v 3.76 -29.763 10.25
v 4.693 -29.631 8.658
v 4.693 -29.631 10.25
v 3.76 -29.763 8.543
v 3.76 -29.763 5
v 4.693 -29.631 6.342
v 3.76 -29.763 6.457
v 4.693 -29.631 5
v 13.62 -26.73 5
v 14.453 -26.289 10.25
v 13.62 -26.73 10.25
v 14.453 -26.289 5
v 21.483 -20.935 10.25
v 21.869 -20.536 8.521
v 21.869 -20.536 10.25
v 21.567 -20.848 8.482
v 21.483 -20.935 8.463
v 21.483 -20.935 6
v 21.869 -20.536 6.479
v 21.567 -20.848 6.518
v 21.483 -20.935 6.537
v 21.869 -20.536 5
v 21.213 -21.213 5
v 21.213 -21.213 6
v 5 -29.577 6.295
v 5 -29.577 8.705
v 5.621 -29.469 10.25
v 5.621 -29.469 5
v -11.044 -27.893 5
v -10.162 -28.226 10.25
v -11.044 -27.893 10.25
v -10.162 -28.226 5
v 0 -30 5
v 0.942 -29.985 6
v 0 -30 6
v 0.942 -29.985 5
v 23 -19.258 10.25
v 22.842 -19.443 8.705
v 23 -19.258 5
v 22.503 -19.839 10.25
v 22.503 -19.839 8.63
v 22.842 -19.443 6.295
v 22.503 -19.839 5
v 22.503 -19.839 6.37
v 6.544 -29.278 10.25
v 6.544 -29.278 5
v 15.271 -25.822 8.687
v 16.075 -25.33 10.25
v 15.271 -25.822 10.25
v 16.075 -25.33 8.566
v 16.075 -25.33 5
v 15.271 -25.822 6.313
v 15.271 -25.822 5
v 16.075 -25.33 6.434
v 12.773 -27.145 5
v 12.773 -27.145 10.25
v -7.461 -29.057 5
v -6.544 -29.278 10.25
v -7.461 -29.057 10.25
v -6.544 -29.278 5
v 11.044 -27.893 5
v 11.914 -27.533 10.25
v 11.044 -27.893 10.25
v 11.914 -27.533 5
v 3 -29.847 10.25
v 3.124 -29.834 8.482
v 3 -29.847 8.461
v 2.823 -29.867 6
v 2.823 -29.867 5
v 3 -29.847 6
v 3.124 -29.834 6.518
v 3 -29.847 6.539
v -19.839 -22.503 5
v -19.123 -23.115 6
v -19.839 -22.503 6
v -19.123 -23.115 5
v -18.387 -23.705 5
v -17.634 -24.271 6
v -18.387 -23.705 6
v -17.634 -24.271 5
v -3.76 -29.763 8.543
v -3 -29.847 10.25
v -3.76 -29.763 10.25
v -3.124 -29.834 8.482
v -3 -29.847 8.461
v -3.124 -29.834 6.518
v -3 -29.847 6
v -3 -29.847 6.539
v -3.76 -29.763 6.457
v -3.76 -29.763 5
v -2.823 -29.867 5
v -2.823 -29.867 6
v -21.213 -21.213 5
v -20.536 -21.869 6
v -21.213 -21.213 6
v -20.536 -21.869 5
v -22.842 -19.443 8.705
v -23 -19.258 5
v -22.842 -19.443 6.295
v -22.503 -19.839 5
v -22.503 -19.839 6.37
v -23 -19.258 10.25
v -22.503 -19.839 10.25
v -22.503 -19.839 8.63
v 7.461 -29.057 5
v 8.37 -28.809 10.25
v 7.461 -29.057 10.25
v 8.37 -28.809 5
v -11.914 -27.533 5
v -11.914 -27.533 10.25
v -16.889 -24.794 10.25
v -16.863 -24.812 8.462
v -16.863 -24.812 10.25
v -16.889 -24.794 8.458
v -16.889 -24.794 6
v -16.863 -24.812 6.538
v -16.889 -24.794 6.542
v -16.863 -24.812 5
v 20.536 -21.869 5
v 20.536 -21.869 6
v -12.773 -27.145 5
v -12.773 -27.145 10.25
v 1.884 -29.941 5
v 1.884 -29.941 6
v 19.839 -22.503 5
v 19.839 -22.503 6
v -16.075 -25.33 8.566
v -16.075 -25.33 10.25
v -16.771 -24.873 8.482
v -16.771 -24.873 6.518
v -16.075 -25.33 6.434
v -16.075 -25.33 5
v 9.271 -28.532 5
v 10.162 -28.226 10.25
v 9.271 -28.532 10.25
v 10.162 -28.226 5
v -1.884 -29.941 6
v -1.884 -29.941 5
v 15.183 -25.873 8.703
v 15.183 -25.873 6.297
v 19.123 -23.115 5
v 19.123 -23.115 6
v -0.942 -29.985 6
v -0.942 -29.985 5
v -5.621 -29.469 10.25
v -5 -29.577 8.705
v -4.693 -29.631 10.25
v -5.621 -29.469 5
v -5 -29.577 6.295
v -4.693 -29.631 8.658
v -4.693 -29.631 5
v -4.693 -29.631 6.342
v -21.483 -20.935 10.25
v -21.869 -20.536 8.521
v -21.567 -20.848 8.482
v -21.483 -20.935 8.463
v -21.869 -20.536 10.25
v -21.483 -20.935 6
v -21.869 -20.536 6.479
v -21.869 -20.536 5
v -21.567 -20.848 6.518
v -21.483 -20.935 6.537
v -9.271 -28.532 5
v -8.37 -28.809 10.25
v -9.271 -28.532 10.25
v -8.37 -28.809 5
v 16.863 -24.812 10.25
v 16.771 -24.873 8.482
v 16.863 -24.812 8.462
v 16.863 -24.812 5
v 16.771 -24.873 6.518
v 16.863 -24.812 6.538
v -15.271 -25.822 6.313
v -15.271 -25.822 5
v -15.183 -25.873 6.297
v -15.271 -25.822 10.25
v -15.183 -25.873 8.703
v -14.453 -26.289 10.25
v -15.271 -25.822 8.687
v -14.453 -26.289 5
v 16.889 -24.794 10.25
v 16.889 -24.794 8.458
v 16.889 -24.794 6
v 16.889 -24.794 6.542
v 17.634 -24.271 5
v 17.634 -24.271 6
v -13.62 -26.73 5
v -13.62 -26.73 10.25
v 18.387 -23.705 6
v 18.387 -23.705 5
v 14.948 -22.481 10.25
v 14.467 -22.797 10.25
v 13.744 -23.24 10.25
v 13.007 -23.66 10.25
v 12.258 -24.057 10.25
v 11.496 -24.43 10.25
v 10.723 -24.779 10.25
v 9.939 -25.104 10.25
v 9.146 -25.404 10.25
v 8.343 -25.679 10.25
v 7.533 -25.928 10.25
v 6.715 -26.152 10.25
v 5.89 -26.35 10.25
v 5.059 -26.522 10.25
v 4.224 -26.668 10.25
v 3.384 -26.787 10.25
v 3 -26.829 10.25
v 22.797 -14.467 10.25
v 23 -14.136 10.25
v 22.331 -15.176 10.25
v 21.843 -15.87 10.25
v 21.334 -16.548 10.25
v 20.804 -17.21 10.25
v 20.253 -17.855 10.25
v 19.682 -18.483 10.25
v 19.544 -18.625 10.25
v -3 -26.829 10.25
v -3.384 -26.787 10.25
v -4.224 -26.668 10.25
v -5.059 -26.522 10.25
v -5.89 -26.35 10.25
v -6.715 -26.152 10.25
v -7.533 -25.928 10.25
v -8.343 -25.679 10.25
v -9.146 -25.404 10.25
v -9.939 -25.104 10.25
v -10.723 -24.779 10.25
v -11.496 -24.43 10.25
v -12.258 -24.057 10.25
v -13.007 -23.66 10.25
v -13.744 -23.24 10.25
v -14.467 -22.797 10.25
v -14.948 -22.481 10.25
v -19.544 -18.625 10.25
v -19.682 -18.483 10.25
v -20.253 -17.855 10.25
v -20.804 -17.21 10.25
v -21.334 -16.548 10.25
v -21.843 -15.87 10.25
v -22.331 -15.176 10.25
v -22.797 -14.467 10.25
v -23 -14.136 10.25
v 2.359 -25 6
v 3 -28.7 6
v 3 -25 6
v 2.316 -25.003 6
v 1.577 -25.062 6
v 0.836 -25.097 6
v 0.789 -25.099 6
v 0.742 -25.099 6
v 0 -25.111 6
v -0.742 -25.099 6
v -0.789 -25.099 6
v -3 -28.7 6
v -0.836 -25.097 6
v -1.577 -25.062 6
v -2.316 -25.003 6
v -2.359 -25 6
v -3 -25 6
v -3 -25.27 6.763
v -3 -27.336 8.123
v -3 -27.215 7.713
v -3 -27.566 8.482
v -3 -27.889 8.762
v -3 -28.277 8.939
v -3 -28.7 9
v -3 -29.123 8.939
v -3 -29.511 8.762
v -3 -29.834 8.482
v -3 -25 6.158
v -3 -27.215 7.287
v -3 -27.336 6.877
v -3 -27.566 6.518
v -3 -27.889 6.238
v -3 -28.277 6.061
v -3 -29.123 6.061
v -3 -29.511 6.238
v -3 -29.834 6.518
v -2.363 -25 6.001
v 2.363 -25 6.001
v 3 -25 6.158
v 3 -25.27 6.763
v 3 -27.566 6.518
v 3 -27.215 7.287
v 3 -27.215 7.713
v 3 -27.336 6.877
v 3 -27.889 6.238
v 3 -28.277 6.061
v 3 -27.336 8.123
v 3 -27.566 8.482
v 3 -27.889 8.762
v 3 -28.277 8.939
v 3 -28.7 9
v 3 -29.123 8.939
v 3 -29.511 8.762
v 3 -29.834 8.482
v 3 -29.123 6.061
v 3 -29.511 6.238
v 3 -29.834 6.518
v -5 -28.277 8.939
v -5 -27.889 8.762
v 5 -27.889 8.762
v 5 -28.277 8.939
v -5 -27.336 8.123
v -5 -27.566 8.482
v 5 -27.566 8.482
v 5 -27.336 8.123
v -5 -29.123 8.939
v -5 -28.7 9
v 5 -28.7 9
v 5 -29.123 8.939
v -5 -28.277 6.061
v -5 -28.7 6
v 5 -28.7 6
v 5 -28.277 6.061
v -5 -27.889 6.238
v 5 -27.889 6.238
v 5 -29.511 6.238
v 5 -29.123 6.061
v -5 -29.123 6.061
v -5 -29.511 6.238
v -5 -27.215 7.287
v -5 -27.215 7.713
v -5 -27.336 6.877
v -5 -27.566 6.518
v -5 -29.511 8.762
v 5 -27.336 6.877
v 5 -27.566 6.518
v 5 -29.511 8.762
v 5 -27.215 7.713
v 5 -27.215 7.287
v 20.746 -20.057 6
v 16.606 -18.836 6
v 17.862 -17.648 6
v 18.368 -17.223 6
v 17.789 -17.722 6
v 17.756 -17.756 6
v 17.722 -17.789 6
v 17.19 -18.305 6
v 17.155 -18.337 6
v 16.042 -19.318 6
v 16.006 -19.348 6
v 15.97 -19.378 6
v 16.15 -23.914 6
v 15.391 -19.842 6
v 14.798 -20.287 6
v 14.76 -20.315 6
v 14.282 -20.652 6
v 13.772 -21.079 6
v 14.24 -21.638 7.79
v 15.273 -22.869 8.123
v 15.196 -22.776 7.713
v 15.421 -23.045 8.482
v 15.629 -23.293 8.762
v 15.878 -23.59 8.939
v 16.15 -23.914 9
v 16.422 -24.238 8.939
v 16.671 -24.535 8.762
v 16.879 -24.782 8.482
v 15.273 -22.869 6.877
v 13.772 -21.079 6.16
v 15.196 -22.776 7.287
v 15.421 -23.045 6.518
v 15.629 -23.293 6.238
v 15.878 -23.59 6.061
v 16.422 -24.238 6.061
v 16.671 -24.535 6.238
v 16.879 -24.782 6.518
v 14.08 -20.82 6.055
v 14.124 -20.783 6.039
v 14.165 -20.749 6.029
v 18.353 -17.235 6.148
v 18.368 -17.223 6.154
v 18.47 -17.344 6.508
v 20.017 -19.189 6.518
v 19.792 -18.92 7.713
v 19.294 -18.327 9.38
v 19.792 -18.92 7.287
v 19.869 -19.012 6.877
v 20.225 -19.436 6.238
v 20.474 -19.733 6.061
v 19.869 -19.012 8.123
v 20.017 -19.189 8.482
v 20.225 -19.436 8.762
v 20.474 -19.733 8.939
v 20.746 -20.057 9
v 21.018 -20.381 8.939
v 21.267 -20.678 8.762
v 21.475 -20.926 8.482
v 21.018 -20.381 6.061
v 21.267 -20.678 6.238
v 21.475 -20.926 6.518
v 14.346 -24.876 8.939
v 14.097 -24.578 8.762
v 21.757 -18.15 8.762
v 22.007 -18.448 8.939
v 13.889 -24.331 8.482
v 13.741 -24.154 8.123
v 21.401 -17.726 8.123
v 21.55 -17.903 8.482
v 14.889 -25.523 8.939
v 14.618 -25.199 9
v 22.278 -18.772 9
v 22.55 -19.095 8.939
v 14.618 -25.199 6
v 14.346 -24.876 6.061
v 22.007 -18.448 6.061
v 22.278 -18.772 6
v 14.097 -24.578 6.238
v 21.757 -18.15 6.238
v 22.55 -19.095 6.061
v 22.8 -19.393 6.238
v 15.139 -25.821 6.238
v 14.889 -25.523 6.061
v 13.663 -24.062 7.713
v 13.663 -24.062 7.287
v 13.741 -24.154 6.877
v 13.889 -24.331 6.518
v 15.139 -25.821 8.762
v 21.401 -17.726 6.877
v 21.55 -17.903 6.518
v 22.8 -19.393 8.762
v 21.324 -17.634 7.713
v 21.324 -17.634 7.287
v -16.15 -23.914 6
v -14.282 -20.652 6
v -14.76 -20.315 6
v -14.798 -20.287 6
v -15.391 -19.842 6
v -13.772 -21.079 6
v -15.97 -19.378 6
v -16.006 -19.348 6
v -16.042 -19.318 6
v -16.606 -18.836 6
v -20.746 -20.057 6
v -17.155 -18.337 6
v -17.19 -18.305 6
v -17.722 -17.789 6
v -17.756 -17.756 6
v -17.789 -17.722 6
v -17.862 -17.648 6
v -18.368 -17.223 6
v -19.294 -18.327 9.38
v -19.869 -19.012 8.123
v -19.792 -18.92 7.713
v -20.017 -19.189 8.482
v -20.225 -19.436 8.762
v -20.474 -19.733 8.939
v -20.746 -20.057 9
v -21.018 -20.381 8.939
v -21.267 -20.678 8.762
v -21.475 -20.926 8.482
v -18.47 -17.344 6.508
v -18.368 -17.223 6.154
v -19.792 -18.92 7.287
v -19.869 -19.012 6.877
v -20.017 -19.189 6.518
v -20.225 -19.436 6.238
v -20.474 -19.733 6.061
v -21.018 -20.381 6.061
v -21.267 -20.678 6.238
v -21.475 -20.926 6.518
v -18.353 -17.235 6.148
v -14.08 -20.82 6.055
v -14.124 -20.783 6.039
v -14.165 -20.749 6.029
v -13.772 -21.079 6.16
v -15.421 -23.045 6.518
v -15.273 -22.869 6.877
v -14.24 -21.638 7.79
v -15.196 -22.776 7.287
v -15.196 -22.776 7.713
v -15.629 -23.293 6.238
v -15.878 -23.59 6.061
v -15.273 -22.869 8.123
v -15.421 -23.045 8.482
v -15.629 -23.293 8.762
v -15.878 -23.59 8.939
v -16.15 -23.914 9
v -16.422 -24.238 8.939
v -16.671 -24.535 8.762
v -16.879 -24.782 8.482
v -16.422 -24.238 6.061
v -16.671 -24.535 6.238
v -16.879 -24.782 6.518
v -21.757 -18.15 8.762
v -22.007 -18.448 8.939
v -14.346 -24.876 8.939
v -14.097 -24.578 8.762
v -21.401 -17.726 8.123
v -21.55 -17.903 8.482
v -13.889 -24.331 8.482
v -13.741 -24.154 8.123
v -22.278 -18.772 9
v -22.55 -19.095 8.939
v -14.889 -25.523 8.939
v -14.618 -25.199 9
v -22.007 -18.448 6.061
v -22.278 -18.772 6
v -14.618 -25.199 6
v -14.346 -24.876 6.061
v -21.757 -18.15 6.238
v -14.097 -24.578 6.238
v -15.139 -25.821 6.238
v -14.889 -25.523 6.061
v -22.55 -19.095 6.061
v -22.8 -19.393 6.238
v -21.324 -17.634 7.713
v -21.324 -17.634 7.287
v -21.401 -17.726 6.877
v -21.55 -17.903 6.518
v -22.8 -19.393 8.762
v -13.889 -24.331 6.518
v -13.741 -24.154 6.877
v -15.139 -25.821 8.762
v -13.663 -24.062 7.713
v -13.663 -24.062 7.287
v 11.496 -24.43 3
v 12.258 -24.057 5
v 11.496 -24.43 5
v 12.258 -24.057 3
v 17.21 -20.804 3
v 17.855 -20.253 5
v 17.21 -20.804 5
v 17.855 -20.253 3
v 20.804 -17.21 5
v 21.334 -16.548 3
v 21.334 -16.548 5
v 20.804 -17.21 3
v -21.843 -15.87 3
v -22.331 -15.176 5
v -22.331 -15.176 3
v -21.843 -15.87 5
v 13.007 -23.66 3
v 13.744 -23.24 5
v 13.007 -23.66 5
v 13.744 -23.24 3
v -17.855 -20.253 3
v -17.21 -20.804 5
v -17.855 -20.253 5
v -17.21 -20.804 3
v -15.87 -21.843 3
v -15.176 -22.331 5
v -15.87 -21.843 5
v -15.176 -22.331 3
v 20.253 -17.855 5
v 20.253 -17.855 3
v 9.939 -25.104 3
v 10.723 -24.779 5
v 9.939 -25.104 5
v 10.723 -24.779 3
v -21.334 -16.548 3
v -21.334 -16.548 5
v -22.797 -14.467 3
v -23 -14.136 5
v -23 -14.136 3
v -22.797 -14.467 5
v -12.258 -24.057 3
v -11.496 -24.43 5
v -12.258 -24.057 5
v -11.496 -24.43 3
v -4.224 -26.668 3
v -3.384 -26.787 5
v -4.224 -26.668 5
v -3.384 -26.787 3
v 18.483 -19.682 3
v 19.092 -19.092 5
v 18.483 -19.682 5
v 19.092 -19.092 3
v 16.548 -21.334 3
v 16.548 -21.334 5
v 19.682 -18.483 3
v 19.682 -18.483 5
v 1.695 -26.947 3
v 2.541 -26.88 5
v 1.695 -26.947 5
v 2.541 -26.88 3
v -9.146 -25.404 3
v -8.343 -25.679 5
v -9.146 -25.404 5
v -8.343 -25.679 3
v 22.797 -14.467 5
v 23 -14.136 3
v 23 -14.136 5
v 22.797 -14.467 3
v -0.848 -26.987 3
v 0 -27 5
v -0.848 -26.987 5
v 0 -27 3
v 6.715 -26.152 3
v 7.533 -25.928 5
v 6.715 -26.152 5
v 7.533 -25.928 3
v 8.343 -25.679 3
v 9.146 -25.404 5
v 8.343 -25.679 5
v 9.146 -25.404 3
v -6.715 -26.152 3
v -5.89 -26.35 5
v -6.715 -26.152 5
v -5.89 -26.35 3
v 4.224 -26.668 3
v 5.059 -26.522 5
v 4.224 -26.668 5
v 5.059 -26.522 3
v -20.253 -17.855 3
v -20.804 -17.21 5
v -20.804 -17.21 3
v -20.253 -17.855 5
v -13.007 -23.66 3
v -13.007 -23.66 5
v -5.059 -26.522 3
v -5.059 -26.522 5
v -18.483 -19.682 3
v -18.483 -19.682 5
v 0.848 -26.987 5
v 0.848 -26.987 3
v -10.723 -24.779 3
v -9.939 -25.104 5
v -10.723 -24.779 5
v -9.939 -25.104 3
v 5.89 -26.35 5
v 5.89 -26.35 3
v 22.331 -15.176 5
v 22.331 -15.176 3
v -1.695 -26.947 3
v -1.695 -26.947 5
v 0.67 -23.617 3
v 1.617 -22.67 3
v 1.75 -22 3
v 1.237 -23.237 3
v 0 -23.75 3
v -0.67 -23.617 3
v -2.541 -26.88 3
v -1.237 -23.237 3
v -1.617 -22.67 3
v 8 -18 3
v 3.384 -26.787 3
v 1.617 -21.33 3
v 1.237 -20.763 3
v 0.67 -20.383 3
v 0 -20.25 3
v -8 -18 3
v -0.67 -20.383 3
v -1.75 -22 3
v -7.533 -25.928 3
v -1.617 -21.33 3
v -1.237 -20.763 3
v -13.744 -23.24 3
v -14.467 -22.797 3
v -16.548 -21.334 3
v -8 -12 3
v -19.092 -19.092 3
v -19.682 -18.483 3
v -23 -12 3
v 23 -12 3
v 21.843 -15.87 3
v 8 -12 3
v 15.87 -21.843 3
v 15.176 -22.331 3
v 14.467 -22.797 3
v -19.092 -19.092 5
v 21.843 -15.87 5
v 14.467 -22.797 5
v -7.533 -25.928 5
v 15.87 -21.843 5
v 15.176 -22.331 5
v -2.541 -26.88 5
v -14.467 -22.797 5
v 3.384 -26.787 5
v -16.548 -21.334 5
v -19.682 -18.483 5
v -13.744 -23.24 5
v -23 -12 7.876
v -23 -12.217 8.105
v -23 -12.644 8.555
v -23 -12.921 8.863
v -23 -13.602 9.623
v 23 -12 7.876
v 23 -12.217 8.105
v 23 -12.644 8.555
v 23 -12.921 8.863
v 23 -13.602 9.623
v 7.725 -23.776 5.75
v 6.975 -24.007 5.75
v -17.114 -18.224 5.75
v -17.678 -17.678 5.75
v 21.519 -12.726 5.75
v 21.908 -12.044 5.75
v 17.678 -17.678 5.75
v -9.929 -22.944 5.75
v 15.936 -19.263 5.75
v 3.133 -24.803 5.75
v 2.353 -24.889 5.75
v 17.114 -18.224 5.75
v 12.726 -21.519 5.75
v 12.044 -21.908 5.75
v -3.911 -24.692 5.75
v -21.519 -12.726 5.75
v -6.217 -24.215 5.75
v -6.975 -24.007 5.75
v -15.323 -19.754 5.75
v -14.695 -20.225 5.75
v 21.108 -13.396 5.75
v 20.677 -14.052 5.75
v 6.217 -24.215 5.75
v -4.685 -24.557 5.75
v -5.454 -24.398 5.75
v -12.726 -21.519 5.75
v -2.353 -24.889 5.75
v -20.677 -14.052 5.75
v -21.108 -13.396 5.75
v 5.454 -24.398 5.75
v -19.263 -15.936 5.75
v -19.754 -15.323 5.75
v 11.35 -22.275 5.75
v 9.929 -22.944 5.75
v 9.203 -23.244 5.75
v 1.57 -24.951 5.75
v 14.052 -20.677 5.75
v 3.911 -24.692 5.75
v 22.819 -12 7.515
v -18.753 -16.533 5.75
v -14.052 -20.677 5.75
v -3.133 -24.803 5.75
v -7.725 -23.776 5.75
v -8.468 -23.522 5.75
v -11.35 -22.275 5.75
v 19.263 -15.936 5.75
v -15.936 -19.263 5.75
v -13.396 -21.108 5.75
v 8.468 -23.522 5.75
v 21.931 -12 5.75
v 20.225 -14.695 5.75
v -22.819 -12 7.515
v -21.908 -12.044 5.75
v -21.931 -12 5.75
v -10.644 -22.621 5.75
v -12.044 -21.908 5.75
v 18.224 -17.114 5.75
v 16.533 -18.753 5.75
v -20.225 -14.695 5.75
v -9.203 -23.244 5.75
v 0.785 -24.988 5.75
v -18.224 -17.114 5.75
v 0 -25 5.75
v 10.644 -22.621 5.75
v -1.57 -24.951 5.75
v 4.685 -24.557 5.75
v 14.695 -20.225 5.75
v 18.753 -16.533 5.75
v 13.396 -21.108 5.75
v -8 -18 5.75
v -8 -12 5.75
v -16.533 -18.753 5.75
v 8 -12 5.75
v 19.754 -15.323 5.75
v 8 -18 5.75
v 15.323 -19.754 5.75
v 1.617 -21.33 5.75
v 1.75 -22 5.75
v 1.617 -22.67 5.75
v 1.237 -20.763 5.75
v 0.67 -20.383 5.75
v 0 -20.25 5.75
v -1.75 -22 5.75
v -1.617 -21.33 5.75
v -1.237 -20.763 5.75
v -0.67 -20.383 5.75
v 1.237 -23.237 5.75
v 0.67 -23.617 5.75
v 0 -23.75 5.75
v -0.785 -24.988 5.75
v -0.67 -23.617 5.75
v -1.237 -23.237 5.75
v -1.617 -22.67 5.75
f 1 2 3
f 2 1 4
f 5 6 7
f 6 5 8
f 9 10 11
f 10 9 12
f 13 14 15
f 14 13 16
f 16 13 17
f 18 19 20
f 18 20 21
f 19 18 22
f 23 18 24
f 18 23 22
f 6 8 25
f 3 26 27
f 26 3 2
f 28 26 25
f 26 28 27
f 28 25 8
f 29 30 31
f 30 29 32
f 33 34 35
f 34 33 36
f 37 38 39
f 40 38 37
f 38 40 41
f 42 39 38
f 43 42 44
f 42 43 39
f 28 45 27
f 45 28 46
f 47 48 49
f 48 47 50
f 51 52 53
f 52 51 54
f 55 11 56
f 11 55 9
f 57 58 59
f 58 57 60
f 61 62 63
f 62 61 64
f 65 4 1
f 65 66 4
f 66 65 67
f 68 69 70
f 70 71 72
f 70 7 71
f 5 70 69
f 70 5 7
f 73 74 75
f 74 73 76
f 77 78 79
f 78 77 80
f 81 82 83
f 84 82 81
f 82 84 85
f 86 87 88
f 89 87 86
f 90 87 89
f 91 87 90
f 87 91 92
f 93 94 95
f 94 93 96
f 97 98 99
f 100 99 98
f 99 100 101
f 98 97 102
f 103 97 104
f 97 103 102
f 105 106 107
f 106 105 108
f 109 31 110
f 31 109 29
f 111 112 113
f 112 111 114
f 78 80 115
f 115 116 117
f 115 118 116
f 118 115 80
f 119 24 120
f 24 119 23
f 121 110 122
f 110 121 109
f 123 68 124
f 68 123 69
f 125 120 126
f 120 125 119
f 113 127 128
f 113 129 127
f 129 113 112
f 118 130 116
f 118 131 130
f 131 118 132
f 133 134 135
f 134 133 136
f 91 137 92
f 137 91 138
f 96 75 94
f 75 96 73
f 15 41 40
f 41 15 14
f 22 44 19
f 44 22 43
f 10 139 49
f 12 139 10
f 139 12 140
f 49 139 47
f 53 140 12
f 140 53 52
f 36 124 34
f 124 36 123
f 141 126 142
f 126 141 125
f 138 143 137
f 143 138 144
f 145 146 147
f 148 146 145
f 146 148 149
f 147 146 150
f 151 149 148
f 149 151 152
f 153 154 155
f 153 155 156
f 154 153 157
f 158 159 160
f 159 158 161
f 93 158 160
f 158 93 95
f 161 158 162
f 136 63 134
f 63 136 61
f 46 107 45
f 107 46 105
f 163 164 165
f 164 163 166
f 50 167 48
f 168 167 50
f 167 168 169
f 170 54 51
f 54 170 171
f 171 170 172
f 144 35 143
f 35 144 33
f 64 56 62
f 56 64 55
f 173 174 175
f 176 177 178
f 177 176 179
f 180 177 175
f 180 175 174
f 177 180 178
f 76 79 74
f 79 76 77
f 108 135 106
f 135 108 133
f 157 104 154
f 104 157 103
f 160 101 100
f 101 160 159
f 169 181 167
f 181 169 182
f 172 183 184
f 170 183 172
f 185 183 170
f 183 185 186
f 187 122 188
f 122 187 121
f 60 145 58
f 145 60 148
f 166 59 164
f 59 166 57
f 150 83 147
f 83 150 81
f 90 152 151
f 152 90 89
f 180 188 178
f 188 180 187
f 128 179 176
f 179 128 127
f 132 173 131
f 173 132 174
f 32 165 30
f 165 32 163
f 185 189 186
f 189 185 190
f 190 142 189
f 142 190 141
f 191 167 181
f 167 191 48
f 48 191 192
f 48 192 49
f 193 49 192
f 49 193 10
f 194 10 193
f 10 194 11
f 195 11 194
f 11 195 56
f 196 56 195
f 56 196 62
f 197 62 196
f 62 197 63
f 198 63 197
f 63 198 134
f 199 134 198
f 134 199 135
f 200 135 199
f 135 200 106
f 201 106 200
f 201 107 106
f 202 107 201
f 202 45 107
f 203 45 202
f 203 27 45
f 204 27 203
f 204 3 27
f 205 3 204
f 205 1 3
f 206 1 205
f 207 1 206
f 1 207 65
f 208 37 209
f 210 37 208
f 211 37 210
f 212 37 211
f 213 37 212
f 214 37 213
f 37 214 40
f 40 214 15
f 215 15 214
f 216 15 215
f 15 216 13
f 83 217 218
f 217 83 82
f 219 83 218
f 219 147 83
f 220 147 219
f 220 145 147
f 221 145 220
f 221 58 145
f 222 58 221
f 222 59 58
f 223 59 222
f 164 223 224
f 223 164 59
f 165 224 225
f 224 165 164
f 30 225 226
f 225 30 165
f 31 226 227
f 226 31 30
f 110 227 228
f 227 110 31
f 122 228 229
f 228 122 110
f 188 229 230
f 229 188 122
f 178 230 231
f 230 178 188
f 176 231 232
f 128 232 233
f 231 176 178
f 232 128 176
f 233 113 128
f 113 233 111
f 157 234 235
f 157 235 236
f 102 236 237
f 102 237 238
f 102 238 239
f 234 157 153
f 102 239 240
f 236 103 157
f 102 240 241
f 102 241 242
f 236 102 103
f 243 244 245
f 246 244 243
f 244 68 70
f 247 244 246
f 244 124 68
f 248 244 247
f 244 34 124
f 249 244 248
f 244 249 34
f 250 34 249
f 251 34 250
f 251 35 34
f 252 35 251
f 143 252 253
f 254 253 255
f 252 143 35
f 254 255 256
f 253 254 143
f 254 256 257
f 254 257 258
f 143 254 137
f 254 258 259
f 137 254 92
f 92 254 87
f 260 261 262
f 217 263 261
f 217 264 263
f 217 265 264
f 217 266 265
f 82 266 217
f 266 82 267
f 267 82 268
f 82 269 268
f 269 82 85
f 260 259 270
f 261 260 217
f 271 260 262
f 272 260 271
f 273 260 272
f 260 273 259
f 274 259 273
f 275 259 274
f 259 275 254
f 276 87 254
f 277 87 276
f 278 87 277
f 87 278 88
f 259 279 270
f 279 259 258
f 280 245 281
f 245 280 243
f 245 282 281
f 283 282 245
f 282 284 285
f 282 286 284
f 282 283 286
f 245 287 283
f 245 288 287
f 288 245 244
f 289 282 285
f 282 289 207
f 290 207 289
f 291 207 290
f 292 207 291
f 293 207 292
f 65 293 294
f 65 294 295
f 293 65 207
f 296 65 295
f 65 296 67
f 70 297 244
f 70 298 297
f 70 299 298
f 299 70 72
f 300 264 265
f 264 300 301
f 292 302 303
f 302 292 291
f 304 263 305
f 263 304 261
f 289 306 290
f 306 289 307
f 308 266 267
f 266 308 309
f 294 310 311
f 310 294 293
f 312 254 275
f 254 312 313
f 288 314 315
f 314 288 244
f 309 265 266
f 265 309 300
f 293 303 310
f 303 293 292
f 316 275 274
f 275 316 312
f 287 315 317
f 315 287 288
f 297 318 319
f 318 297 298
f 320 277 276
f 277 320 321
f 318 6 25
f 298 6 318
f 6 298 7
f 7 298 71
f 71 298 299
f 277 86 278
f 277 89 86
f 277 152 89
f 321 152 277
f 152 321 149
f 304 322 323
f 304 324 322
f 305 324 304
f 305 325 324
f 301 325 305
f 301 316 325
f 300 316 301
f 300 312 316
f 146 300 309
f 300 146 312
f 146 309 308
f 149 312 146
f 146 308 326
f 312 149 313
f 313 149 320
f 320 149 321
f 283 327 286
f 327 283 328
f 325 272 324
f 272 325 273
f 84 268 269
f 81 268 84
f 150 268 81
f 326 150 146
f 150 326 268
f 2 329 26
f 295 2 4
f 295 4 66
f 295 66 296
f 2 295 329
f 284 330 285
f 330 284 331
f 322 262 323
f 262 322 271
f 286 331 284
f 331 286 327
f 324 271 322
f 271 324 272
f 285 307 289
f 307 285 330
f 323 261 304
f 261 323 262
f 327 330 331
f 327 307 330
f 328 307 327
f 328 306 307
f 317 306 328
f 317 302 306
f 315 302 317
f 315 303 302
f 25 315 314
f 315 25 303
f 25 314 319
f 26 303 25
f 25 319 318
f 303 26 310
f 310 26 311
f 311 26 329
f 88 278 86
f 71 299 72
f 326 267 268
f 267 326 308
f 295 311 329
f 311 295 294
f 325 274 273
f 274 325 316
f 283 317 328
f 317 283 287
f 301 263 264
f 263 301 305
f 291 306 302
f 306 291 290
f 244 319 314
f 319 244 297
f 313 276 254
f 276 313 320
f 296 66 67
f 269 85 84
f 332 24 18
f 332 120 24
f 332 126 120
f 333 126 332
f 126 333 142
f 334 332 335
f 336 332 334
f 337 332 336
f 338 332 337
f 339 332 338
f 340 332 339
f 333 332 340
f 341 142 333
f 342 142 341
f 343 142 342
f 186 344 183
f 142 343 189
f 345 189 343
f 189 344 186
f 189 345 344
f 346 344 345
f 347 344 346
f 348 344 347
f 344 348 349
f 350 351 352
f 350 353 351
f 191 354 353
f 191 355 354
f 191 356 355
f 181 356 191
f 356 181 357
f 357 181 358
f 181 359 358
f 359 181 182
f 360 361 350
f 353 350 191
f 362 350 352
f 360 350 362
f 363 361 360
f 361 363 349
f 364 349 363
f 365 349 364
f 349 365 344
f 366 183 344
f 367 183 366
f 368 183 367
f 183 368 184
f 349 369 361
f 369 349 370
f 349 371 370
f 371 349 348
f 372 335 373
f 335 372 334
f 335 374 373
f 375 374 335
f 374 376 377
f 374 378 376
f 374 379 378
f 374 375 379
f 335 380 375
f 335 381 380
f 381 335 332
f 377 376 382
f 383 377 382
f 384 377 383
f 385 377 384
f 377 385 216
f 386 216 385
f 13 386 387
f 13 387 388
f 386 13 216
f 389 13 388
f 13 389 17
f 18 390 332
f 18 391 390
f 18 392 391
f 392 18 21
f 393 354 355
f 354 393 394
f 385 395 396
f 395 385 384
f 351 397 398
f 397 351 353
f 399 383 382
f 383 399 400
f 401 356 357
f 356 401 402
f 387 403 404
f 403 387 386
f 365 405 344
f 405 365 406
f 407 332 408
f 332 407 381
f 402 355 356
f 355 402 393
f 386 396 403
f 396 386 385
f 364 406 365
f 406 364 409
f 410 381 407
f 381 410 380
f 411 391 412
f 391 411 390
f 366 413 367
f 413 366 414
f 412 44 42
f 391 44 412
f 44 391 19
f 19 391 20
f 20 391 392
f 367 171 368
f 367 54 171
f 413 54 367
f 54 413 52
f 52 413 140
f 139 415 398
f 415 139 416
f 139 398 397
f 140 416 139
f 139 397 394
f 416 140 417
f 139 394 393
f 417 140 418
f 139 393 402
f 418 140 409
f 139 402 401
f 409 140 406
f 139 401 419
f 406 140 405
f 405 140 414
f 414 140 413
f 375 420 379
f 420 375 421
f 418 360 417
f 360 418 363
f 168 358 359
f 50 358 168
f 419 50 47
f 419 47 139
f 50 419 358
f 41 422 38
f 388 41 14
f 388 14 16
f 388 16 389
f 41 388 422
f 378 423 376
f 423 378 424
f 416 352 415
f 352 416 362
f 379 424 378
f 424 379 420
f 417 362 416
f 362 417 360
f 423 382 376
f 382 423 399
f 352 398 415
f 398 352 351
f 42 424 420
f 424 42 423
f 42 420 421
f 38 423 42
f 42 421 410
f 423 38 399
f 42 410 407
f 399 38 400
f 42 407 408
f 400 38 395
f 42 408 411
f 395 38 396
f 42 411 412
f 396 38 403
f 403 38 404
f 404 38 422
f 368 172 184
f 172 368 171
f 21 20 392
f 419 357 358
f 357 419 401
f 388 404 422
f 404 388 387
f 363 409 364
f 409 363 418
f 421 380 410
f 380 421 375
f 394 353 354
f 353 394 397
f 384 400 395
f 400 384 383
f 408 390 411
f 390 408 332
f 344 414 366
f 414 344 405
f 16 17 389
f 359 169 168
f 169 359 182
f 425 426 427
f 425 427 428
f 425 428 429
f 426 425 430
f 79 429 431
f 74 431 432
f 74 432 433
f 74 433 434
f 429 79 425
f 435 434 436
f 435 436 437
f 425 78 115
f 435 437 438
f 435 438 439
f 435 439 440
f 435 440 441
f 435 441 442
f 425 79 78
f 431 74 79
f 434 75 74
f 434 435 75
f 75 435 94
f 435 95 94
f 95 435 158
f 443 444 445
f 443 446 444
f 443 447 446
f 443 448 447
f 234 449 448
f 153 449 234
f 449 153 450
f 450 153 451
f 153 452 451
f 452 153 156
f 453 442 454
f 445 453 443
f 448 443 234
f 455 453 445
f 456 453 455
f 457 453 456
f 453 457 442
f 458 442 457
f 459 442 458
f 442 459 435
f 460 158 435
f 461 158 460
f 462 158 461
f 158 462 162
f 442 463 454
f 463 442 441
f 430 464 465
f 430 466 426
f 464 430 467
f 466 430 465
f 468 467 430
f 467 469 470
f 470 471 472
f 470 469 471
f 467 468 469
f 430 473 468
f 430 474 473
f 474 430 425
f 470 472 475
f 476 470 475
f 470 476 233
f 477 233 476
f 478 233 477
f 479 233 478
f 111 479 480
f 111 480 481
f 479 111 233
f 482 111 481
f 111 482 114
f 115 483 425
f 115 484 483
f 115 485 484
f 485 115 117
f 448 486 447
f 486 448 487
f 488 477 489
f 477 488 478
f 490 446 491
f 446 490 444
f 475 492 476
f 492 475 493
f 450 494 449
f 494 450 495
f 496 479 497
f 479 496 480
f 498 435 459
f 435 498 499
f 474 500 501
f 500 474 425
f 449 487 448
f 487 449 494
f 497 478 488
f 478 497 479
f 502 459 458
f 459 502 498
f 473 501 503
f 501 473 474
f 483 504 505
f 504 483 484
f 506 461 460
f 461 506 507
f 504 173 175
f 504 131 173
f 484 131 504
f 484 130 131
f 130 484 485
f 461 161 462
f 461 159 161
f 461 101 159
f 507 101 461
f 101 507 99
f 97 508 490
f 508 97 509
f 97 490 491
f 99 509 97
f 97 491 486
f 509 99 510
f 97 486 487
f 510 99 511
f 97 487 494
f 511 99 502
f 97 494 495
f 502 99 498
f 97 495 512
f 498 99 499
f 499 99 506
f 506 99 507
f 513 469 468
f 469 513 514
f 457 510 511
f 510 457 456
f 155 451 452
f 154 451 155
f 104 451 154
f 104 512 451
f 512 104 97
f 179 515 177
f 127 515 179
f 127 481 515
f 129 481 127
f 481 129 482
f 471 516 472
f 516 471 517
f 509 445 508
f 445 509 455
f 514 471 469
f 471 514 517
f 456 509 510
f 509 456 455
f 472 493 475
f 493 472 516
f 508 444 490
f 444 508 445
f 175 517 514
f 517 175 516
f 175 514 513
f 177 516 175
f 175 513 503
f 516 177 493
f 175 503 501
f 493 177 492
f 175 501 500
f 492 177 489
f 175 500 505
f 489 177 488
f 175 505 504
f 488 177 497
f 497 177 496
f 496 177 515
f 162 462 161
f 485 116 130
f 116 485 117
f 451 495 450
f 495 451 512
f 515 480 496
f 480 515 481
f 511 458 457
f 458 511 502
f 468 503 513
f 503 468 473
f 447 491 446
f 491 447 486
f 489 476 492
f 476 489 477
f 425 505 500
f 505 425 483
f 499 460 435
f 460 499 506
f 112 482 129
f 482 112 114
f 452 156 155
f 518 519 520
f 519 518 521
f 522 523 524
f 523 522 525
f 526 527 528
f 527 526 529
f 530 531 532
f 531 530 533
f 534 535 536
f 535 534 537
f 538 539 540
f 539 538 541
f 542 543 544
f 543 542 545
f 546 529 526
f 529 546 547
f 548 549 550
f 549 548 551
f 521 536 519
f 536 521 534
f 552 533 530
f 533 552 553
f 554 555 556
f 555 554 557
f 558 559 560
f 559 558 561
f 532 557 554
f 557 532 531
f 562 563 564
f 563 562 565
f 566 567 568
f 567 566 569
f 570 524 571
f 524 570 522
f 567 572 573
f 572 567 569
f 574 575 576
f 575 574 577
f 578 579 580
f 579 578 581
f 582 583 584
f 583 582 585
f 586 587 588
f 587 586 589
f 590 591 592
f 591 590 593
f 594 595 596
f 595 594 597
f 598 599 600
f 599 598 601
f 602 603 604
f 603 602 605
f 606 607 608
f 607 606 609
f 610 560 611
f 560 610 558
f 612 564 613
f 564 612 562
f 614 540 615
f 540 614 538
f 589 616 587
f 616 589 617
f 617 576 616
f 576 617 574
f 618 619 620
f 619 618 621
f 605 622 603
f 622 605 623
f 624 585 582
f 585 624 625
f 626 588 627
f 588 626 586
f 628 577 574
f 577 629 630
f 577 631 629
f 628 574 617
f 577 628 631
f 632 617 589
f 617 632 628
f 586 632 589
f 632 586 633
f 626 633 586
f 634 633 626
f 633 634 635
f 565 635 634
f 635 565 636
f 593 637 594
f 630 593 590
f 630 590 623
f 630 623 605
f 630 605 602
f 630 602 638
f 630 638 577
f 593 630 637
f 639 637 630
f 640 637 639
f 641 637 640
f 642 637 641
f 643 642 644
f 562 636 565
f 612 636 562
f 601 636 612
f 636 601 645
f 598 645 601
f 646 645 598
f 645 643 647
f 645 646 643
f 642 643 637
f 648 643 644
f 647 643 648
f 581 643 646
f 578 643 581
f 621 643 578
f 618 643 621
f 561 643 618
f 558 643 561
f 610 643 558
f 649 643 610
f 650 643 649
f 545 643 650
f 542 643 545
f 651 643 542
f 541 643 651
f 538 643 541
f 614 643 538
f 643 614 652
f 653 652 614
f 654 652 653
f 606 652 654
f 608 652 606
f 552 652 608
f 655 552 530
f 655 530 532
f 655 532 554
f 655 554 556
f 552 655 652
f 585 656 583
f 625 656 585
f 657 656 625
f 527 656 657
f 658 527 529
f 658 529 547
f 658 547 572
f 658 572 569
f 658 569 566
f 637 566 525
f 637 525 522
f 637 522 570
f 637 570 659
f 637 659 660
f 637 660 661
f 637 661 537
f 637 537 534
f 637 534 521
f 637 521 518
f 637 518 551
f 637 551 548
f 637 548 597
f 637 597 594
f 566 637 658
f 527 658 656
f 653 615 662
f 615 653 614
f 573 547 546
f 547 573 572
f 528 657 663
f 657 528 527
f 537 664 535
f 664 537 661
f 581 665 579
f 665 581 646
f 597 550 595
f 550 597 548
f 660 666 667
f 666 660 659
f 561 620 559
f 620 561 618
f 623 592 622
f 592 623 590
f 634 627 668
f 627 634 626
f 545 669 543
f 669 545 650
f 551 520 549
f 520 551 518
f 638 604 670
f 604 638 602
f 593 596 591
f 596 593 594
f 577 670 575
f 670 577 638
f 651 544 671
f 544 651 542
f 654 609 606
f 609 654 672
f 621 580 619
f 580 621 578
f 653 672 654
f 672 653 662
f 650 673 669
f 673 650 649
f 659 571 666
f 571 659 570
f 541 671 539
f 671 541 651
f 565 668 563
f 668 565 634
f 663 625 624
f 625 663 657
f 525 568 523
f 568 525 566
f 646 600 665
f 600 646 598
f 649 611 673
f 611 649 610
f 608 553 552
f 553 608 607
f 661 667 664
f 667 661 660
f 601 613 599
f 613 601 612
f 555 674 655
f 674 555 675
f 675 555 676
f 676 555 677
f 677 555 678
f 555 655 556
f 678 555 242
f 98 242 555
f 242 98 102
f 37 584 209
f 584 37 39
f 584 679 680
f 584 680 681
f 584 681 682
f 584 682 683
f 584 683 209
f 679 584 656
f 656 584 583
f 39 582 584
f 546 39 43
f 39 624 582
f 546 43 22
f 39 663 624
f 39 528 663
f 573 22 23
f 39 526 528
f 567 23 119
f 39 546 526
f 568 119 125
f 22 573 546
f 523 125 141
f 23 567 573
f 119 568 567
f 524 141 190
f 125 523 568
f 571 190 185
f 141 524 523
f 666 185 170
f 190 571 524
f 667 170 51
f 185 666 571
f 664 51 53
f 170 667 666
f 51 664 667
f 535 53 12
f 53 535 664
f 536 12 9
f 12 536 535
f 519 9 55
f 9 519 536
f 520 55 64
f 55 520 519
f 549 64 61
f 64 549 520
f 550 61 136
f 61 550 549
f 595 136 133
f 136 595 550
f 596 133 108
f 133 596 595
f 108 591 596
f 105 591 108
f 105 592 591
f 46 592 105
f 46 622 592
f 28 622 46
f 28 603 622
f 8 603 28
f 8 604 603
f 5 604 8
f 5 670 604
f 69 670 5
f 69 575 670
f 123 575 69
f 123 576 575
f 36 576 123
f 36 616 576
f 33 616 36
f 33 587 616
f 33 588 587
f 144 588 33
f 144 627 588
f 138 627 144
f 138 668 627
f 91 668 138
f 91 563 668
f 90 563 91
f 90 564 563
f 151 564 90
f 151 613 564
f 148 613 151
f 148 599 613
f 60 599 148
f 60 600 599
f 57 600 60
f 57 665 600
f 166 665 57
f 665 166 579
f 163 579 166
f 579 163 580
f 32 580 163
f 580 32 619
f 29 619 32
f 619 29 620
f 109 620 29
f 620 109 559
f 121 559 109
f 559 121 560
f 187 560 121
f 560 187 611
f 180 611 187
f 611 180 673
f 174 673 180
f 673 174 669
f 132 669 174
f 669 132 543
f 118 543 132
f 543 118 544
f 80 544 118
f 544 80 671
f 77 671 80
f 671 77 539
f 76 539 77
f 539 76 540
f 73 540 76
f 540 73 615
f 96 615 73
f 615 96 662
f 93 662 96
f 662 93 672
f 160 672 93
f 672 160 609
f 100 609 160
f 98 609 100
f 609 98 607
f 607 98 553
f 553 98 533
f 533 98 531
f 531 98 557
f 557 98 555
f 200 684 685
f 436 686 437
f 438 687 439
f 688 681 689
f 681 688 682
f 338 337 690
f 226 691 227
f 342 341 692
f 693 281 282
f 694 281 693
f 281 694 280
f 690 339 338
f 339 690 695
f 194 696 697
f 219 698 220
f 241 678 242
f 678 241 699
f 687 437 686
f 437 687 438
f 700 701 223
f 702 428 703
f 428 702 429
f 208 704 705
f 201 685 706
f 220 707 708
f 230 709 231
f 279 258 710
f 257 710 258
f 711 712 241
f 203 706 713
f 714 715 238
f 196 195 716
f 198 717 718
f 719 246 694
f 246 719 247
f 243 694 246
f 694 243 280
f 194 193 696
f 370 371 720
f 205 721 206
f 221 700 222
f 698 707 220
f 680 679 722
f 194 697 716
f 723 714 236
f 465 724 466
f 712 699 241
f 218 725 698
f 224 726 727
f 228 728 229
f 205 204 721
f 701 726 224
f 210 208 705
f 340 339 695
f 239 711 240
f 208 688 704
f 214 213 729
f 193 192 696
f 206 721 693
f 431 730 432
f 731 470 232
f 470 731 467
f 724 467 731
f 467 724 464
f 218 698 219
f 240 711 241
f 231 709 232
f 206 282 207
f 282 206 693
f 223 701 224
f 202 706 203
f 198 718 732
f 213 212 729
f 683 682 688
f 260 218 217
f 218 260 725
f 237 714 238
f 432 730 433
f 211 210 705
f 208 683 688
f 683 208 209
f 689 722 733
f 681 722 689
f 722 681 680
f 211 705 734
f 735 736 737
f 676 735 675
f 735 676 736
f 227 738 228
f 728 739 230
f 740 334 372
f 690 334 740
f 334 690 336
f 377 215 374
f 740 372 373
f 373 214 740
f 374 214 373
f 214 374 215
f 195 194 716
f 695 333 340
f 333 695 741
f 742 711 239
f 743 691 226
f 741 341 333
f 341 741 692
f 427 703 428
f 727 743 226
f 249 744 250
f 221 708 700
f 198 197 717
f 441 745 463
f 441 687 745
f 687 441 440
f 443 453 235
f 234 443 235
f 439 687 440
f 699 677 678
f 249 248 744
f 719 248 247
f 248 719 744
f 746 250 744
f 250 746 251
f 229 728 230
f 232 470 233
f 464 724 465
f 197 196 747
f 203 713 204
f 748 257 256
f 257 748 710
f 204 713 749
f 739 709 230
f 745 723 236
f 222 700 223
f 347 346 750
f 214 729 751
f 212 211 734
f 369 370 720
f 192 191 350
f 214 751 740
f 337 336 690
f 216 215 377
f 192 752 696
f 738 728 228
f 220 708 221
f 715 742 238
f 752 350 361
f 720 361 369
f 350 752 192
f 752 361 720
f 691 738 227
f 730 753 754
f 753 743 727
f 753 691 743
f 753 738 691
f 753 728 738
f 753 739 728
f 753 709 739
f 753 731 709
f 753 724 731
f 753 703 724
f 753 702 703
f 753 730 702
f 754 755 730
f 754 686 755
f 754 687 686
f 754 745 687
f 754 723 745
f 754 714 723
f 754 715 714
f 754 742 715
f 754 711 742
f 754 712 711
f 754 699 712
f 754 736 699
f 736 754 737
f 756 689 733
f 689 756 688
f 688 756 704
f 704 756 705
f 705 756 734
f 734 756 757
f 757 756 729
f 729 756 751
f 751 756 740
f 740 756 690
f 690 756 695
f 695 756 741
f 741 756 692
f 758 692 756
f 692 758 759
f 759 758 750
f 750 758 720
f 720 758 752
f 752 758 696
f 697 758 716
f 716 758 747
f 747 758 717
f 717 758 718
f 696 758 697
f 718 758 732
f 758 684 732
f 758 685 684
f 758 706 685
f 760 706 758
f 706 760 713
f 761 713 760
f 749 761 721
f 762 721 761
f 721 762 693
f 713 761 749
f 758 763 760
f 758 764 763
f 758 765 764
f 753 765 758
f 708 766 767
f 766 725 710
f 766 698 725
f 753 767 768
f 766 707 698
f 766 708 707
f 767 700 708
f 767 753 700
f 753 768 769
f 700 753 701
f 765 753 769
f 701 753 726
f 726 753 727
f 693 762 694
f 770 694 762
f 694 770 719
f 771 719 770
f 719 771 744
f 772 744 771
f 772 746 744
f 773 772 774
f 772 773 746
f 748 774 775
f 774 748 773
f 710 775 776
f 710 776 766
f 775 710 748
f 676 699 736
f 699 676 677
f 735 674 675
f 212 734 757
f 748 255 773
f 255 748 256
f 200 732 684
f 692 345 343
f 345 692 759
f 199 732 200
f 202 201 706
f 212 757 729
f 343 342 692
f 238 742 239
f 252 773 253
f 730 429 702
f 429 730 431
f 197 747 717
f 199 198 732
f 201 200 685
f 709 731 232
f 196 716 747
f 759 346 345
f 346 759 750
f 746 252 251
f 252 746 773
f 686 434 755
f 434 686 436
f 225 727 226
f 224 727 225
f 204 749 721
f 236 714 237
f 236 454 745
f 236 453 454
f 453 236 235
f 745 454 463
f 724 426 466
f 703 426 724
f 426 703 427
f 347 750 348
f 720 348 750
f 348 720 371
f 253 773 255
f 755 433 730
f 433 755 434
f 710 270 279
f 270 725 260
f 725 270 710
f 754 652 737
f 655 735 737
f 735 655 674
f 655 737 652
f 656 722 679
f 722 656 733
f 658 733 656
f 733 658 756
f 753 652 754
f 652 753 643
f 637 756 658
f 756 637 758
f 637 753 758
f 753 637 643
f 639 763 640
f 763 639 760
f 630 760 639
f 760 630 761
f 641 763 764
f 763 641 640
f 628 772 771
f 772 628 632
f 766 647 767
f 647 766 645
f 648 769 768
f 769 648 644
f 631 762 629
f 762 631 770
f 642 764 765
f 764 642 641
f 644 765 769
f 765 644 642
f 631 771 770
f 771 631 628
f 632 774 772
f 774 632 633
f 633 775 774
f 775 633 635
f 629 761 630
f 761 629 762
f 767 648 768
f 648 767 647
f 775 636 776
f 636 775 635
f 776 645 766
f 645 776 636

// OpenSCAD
tol=0.25;


intersection(){
        translate([0,-30,0])
linear_extrude(height=20) square(size=[46,80],center=true);

difference(){

    union(){
        // main boss
        translate([0,0,2]) color("yellow")
        linear_extrude(height=4)  circle(r=30,center=true,$fn=200);
        
        // rail for hinges
        translate([0,0,8])
        cylinder(r=30,h=4.5,center=true,$fn=200);
    }

    // cuts front to back etc
    translate([0,0,8])
    cylinder(r1=25,r2=27,h=4.5,center=true,$fn=200);
        
    translate([0,0,0]) color("yellow")
    linear_extrude(height=12)  square(size=[80,24],center=true);
    
    translate([0,-14,0])
    linear_extrude(height=12)  square(size=[16,8],center=true);

    // cutouts for hinges in 6 locations
    for(a=[0, 40, -40, 180, 180-40, 180+40])
    rotate([0,0,a])
    translate([0,-28,6]) color("red"){

            linear_extrude(height=5,scale=1)
            square(size=[6,6],center=true);
            
            translate([0,-0.7,1.5]) rotate([0,90,0])
            cylinder(r=1.5,h=10,center=true,$fn=22);
        }

difference(){

// Base boss
    union(){
        translate([0,0,0]) color("yellow")
        linear_extrude(height=9)  circle(r=30,center=true,$fn=200);


    }
    
// Simplified version of BB1a
    translate([-27,-1,2]) rotate([90,0,0])
    union(){
        translate([27,1,-1]) color("pink") rotate([-90,0,0])
        linear_extrude(height=65)  circle(r=27,center=true,$fn=200);

        // Base 1 plate
        B1p=[ [0,0], [54,0], [54,70], [44,80],
        [10,80], [0,70] ];
        translate([0,0,0]) color("gray")
        linear_extrude(height=4.5)
        polygon(points=B1p);

        // Bottom side outer rail  THICKENED 
        translate ([0,0,-11.5]) color("gray") 
            linear_extrude(height=11.5,convexity=100) polygon(points=B1p);
        
 

        // extra block  cutout for the battery cable
        translate([-4,5,4]) color("pink"){
            linear_extrude(height=18) 
            offset(r=tol)
             square(size=[14, 14]);
        }
        
        // another cutout for the USB charger plug
        translate([6,-4,0]) color("red"){
            linear_extrude(height=9) 
            //offset(r=1,$fn=8) offset(r=-1,$fn=8)
            square(size=[14, 16]);
        }
        
        // Front to back cut
        translate([4,3,-40]) color("cyan"){
            // switch body including solder lug clearance
            linear_extrude(height=80) 
             square(size=[46, 30]);
        }
        
        
        
    }  // end of BB1a union



} // end of top boss difference cuts   

    // New bolt hole for gasket and internal features
    translate([0,-22,0]) color("cyan"){
        cylinder(r=1.5+tol,h=20,center=true,$fn=16);
    }
    // New bolt hole for gasket and internal features
    translate([-14,17,0]) color("cyan"){
        cylinder(r=1.5+tol,h=20,center=true,$fn=16);
    }
    // New bolt hole for gasket and internal features
    translate([14,17,0]) color("cyan"){
        cylinder(r=1.5+tol,h=20,center=true,$fn=16);
    }

    
// add text for Brights
translate ([0,-12,2.4]) rotate([0,0,0]) color("red") 
    linear_extrude(height=1.2){
    text("4B", font = "Open Sans:style=Bold", size=7,halign="center",valign="center",spacing=1.1);
    }



difference(){
    // topside reinforce pogo pins
    translate([0,16,3.0]) color("red")
    linear_extrude(height=4,scale=0.8)
    offset(r=2+tol,$fn=8) square(size=[12,7],center=true);

}
}
}

/*

for(a=[0, 40, -40, 180, 180-40, 180+40])
    rotate([0,0,a])
    translate([0,-27,7]) color("red"){
        difference(){
            linear_extrude(height=4.5,scale=1)
            offset(r=1,$fn=8) square(size=[24,2],center=true);

            linear_extrude(height=5,scale=1)
            square(size=[6,4],center=true);
            
            translate([0,-0.7,1.5]) rotate([0,90,0])
            cylinder(r=1.5,h=10,center=true,$fn=22);
        }
    }


*/
